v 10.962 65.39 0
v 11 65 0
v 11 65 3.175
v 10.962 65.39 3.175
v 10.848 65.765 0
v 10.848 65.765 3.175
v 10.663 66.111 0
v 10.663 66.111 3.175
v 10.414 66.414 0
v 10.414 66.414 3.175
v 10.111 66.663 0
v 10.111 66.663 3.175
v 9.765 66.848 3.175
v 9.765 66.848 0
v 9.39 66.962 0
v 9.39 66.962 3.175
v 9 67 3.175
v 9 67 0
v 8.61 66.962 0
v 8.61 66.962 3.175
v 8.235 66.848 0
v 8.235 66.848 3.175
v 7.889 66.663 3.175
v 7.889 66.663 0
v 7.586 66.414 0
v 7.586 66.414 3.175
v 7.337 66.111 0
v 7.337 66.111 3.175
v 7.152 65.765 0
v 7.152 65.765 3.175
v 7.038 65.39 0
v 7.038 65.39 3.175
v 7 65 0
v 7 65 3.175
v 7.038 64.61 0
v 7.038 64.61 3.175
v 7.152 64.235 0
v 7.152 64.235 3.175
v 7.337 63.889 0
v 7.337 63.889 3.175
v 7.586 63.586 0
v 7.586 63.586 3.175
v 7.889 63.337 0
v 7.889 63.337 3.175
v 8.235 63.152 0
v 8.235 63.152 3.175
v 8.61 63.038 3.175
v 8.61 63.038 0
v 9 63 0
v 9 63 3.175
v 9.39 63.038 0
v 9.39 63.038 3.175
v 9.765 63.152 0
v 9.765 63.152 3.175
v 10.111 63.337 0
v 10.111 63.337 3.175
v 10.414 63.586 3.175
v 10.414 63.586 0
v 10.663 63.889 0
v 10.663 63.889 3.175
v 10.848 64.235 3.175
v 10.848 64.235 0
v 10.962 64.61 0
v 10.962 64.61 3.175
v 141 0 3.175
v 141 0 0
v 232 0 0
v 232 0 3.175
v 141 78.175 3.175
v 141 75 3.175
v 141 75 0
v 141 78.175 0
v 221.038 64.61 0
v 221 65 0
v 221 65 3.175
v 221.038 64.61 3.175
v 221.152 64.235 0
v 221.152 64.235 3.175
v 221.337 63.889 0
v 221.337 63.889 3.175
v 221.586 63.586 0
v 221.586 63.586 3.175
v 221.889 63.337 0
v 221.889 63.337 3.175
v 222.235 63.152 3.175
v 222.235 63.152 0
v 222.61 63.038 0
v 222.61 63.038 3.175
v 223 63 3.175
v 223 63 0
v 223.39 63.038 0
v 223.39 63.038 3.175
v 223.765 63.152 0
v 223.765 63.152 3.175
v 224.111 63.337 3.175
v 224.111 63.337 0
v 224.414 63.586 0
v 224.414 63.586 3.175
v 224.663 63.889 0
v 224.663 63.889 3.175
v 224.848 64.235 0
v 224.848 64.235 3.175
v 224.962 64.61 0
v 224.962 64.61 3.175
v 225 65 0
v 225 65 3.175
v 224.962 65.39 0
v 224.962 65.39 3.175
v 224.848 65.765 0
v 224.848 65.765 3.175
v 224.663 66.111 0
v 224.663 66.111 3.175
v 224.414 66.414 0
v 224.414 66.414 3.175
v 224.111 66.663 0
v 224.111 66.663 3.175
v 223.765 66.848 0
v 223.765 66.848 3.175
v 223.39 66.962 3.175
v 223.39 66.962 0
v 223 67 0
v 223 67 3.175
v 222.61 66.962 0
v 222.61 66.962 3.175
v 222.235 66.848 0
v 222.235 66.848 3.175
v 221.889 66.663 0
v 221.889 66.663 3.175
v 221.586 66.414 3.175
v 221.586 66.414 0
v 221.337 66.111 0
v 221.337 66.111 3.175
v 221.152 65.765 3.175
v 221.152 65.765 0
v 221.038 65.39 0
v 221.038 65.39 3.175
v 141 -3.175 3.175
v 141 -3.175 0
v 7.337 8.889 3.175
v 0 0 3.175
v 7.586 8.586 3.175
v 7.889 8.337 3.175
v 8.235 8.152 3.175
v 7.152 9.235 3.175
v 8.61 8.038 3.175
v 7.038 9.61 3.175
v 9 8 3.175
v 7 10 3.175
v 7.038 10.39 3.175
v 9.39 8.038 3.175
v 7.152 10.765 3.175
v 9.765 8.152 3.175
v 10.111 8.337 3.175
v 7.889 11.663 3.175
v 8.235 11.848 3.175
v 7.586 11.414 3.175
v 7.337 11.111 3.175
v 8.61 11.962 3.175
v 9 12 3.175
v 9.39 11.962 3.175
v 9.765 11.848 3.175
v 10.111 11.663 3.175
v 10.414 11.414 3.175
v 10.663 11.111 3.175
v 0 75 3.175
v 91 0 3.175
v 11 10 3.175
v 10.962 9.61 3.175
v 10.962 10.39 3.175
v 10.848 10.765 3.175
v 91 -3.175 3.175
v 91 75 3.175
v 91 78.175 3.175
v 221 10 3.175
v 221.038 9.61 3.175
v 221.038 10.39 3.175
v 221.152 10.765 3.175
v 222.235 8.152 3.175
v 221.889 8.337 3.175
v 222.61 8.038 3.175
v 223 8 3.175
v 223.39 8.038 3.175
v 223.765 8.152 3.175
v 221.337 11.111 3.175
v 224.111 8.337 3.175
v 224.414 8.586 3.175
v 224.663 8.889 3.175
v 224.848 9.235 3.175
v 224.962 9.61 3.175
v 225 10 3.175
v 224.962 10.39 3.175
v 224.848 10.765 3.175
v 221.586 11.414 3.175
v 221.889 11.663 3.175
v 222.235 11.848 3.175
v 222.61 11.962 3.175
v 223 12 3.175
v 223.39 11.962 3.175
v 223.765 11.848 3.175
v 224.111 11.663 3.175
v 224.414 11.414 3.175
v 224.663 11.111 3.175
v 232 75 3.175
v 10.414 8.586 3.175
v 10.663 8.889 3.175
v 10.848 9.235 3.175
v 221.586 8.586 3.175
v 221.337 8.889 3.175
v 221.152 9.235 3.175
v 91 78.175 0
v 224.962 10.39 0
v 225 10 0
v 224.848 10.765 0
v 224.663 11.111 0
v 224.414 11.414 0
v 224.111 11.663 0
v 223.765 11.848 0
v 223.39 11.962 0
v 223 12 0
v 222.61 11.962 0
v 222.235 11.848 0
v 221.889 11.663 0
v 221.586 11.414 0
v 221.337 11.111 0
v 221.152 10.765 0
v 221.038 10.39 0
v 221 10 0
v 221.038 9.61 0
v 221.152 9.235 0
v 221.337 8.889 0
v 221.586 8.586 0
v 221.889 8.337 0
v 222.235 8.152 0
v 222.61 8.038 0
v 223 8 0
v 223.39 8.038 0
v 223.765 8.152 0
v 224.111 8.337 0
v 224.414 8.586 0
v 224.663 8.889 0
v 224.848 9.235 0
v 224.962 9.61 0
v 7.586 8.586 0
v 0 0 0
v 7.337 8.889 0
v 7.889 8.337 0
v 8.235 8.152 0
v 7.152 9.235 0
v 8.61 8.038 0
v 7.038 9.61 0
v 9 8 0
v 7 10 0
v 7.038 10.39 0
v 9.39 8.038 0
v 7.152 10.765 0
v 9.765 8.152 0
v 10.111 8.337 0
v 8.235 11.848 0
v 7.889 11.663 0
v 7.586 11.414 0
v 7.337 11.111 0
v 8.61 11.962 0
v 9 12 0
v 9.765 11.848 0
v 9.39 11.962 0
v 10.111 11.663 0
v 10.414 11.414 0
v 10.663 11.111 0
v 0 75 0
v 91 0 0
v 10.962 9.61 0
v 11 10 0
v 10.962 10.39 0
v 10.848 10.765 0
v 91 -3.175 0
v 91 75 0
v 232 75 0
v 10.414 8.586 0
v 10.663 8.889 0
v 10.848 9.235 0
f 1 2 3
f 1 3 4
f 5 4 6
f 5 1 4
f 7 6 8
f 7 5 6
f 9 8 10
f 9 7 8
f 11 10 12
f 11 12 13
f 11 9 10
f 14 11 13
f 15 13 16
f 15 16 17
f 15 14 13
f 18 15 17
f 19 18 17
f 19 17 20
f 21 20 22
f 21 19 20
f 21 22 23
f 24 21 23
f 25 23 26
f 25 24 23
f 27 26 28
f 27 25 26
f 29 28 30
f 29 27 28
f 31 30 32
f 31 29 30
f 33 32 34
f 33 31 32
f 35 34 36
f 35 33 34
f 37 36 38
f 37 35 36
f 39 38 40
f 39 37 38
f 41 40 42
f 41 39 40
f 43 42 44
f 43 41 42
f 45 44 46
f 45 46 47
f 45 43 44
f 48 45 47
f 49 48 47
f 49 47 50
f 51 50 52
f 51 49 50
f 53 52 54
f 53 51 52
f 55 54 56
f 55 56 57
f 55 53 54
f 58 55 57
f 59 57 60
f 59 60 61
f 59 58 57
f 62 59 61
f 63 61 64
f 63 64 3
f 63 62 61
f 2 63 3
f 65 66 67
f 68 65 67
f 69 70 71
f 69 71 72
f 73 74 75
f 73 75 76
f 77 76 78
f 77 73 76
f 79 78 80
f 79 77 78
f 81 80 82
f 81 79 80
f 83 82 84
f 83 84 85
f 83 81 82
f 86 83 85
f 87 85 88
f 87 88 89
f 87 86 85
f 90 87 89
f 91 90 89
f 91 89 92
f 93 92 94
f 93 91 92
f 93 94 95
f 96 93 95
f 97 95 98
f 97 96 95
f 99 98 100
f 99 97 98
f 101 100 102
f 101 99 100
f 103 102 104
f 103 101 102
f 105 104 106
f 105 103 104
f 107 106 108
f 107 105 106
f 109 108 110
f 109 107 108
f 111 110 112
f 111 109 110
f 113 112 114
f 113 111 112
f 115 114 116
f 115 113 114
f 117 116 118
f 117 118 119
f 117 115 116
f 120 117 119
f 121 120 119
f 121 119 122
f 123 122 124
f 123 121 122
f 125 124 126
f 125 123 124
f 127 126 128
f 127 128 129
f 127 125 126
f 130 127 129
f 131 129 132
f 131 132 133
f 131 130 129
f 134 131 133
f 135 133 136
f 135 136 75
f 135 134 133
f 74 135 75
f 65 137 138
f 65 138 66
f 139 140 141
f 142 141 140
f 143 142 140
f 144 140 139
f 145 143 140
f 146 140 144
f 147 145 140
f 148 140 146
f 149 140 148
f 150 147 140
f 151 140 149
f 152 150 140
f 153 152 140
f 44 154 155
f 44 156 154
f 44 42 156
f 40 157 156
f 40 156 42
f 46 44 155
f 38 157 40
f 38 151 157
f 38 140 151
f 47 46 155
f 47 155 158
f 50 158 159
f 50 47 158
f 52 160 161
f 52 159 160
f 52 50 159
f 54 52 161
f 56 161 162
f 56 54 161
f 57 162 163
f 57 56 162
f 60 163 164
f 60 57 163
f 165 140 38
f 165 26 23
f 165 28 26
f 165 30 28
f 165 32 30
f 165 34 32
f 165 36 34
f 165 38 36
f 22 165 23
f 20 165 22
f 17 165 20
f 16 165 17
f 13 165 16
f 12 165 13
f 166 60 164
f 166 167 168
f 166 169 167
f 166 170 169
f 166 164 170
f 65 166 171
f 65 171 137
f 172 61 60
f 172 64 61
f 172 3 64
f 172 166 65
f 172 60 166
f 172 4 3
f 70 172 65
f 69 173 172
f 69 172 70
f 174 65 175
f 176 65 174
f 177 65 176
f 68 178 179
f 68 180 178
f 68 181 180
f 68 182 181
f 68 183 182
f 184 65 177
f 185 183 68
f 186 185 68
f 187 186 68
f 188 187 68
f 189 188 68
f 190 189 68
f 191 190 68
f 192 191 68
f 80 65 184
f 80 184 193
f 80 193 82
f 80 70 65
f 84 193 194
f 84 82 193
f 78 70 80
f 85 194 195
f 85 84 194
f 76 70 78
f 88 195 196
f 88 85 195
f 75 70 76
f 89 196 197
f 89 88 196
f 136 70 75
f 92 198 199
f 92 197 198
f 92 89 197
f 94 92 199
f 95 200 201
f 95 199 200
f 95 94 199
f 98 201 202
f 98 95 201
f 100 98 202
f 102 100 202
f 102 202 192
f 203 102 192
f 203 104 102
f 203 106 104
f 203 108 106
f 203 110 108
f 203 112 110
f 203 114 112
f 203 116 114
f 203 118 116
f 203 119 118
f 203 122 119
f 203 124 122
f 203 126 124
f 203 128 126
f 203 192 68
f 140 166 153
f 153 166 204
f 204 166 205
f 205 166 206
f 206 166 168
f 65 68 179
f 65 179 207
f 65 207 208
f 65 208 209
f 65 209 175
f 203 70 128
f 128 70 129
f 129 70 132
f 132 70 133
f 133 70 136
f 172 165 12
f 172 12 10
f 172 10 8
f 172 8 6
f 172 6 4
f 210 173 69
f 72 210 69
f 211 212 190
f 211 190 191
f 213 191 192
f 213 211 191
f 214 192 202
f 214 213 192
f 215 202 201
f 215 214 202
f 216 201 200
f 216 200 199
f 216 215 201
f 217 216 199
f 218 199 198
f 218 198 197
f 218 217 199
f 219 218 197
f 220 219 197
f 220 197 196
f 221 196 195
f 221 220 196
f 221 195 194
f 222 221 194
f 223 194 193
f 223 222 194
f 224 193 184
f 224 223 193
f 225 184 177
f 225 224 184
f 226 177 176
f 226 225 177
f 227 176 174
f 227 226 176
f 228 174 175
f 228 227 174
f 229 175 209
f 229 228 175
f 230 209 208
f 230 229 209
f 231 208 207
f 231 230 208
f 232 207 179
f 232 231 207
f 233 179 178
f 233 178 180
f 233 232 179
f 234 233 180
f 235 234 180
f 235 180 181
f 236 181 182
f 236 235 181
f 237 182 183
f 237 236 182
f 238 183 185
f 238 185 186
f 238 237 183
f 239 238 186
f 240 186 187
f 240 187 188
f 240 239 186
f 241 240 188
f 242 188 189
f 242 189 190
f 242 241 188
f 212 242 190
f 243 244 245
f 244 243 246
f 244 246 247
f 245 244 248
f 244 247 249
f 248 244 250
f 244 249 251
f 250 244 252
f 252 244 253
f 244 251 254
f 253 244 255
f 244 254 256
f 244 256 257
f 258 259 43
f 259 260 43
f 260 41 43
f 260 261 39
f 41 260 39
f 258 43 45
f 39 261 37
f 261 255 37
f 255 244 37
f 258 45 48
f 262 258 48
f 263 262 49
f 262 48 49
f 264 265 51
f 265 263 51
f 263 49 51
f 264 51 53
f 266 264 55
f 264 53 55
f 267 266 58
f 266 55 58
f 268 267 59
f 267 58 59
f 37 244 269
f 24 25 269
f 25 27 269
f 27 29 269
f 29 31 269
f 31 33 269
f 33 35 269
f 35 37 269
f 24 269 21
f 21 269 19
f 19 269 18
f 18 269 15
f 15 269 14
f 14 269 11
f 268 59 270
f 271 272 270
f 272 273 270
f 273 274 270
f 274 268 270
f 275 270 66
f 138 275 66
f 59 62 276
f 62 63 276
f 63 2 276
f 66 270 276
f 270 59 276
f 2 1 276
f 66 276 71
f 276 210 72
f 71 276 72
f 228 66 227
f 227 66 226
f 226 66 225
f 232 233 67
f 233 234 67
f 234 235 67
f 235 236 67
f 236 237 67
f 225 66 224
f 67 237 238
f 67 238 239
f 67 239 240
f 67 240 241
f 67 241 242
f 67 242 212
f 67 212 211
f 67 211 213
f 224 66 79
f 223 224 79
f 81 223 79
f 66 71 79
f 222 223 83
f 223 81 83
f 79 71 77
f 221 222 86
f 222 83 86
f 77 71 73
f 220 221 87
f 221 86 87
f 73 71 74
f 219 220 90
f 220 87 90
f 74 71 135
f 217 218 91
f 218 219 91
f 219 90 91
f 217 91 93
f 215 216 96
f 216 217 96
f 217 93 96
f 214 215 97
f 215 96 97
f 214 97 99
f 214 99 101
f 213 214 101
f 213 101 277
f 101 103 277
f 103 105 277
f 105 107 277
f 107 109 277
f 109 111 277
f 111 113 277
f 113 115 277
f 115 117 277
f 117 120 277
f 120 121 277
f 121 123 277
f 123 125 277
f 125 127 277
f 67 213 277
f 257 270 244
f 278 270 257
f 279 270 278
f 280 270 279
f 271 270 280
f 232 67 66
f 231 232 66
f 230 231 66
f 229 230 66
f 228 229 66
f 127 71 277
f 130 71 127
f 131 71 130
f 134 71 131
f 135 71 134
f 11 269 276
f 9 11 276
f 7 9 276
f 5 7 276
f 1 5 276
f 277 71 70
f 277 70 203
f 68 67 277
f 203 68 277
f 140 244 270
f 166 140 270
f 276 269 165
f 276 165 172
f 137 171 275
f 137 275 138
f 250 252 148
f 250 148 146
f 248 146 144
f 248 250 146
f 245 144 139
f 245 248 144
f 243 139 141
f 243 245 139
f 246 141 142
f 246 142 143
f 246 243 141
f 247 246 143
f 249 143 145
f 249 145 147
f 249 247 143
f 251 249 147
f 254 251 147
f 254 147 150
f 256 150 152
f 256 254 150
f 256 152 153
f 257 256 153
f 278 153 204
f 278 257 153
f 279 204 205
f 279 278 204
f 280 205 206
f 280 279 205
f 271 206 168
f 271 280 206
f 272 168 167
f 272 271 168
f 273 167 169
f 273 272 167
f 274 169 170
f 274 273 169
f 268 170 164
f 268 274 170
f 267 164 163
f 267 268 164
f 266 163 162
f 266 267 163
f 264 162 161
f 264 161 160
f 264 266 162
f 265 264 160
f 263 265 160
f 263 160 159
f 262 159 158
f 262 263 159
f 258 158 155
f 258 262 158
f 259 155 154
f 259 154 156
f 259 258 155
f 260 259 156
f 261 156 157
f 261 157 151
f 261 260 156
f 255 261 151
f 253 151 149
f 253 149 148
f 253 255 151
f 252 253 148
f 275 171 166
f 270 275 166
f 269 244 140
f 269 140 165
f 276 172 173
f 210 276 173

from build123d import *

# Parameters (mm, degrees)
SKETCH1_W           = 232
SKETCH1_H           = 75
SKETCH1_R           = 2
BOSS_EXTRUDE1_DEPTH = 3.175
SKETCH2_W           = 50
SKETCH2_H           = 3.175
BOSS_EXTRUDE2_DEPTH = 3.175


with BuildPart() as part:
    # Sketch1 → Boss-Extrude1 (new body)
    with BuildSketch(Plane.XY):
        with Locations((116, 37.5)):
            Rectangle(SKETCH1_W, SKETCH1_H)
        with Locations((9, 65)):
            Circle(SKETCH1_R, mode=Mode.SUBTRACT)
        with Locations(Location((9, 10, 0), (0, 0, 180))):
            Circle(SKETCH1_R, mode=Mode.SUBTRACT)
        with Locations((223, 10)):
            Circle(SKETCH1_R, mode=Mode.SUBTRACT)
        with Locations(Location((223, 65, 0), (0, 0, 180))):
            Circle(SKETCH1_R, mode=Mode.SUBTRACT)
    extrude(amount=BOSS_EXTRUDE1_DEPTH)

    # Sketch2 → Boss-Extrude2 (add)
    with BuildSketch(Plane.XY.offset(3.175)):
        with Locations((116, -1.5875)):
            Rectangle(SKETCH2_W, SKETCH2_H)
        with Locations((116, 76.5875)):
            Rectangle(SKETCH2_W, SKETCH2_H)
    extrude(amount=-BOSS_EXTRUDE2_DEPTH)


solid = part.part
